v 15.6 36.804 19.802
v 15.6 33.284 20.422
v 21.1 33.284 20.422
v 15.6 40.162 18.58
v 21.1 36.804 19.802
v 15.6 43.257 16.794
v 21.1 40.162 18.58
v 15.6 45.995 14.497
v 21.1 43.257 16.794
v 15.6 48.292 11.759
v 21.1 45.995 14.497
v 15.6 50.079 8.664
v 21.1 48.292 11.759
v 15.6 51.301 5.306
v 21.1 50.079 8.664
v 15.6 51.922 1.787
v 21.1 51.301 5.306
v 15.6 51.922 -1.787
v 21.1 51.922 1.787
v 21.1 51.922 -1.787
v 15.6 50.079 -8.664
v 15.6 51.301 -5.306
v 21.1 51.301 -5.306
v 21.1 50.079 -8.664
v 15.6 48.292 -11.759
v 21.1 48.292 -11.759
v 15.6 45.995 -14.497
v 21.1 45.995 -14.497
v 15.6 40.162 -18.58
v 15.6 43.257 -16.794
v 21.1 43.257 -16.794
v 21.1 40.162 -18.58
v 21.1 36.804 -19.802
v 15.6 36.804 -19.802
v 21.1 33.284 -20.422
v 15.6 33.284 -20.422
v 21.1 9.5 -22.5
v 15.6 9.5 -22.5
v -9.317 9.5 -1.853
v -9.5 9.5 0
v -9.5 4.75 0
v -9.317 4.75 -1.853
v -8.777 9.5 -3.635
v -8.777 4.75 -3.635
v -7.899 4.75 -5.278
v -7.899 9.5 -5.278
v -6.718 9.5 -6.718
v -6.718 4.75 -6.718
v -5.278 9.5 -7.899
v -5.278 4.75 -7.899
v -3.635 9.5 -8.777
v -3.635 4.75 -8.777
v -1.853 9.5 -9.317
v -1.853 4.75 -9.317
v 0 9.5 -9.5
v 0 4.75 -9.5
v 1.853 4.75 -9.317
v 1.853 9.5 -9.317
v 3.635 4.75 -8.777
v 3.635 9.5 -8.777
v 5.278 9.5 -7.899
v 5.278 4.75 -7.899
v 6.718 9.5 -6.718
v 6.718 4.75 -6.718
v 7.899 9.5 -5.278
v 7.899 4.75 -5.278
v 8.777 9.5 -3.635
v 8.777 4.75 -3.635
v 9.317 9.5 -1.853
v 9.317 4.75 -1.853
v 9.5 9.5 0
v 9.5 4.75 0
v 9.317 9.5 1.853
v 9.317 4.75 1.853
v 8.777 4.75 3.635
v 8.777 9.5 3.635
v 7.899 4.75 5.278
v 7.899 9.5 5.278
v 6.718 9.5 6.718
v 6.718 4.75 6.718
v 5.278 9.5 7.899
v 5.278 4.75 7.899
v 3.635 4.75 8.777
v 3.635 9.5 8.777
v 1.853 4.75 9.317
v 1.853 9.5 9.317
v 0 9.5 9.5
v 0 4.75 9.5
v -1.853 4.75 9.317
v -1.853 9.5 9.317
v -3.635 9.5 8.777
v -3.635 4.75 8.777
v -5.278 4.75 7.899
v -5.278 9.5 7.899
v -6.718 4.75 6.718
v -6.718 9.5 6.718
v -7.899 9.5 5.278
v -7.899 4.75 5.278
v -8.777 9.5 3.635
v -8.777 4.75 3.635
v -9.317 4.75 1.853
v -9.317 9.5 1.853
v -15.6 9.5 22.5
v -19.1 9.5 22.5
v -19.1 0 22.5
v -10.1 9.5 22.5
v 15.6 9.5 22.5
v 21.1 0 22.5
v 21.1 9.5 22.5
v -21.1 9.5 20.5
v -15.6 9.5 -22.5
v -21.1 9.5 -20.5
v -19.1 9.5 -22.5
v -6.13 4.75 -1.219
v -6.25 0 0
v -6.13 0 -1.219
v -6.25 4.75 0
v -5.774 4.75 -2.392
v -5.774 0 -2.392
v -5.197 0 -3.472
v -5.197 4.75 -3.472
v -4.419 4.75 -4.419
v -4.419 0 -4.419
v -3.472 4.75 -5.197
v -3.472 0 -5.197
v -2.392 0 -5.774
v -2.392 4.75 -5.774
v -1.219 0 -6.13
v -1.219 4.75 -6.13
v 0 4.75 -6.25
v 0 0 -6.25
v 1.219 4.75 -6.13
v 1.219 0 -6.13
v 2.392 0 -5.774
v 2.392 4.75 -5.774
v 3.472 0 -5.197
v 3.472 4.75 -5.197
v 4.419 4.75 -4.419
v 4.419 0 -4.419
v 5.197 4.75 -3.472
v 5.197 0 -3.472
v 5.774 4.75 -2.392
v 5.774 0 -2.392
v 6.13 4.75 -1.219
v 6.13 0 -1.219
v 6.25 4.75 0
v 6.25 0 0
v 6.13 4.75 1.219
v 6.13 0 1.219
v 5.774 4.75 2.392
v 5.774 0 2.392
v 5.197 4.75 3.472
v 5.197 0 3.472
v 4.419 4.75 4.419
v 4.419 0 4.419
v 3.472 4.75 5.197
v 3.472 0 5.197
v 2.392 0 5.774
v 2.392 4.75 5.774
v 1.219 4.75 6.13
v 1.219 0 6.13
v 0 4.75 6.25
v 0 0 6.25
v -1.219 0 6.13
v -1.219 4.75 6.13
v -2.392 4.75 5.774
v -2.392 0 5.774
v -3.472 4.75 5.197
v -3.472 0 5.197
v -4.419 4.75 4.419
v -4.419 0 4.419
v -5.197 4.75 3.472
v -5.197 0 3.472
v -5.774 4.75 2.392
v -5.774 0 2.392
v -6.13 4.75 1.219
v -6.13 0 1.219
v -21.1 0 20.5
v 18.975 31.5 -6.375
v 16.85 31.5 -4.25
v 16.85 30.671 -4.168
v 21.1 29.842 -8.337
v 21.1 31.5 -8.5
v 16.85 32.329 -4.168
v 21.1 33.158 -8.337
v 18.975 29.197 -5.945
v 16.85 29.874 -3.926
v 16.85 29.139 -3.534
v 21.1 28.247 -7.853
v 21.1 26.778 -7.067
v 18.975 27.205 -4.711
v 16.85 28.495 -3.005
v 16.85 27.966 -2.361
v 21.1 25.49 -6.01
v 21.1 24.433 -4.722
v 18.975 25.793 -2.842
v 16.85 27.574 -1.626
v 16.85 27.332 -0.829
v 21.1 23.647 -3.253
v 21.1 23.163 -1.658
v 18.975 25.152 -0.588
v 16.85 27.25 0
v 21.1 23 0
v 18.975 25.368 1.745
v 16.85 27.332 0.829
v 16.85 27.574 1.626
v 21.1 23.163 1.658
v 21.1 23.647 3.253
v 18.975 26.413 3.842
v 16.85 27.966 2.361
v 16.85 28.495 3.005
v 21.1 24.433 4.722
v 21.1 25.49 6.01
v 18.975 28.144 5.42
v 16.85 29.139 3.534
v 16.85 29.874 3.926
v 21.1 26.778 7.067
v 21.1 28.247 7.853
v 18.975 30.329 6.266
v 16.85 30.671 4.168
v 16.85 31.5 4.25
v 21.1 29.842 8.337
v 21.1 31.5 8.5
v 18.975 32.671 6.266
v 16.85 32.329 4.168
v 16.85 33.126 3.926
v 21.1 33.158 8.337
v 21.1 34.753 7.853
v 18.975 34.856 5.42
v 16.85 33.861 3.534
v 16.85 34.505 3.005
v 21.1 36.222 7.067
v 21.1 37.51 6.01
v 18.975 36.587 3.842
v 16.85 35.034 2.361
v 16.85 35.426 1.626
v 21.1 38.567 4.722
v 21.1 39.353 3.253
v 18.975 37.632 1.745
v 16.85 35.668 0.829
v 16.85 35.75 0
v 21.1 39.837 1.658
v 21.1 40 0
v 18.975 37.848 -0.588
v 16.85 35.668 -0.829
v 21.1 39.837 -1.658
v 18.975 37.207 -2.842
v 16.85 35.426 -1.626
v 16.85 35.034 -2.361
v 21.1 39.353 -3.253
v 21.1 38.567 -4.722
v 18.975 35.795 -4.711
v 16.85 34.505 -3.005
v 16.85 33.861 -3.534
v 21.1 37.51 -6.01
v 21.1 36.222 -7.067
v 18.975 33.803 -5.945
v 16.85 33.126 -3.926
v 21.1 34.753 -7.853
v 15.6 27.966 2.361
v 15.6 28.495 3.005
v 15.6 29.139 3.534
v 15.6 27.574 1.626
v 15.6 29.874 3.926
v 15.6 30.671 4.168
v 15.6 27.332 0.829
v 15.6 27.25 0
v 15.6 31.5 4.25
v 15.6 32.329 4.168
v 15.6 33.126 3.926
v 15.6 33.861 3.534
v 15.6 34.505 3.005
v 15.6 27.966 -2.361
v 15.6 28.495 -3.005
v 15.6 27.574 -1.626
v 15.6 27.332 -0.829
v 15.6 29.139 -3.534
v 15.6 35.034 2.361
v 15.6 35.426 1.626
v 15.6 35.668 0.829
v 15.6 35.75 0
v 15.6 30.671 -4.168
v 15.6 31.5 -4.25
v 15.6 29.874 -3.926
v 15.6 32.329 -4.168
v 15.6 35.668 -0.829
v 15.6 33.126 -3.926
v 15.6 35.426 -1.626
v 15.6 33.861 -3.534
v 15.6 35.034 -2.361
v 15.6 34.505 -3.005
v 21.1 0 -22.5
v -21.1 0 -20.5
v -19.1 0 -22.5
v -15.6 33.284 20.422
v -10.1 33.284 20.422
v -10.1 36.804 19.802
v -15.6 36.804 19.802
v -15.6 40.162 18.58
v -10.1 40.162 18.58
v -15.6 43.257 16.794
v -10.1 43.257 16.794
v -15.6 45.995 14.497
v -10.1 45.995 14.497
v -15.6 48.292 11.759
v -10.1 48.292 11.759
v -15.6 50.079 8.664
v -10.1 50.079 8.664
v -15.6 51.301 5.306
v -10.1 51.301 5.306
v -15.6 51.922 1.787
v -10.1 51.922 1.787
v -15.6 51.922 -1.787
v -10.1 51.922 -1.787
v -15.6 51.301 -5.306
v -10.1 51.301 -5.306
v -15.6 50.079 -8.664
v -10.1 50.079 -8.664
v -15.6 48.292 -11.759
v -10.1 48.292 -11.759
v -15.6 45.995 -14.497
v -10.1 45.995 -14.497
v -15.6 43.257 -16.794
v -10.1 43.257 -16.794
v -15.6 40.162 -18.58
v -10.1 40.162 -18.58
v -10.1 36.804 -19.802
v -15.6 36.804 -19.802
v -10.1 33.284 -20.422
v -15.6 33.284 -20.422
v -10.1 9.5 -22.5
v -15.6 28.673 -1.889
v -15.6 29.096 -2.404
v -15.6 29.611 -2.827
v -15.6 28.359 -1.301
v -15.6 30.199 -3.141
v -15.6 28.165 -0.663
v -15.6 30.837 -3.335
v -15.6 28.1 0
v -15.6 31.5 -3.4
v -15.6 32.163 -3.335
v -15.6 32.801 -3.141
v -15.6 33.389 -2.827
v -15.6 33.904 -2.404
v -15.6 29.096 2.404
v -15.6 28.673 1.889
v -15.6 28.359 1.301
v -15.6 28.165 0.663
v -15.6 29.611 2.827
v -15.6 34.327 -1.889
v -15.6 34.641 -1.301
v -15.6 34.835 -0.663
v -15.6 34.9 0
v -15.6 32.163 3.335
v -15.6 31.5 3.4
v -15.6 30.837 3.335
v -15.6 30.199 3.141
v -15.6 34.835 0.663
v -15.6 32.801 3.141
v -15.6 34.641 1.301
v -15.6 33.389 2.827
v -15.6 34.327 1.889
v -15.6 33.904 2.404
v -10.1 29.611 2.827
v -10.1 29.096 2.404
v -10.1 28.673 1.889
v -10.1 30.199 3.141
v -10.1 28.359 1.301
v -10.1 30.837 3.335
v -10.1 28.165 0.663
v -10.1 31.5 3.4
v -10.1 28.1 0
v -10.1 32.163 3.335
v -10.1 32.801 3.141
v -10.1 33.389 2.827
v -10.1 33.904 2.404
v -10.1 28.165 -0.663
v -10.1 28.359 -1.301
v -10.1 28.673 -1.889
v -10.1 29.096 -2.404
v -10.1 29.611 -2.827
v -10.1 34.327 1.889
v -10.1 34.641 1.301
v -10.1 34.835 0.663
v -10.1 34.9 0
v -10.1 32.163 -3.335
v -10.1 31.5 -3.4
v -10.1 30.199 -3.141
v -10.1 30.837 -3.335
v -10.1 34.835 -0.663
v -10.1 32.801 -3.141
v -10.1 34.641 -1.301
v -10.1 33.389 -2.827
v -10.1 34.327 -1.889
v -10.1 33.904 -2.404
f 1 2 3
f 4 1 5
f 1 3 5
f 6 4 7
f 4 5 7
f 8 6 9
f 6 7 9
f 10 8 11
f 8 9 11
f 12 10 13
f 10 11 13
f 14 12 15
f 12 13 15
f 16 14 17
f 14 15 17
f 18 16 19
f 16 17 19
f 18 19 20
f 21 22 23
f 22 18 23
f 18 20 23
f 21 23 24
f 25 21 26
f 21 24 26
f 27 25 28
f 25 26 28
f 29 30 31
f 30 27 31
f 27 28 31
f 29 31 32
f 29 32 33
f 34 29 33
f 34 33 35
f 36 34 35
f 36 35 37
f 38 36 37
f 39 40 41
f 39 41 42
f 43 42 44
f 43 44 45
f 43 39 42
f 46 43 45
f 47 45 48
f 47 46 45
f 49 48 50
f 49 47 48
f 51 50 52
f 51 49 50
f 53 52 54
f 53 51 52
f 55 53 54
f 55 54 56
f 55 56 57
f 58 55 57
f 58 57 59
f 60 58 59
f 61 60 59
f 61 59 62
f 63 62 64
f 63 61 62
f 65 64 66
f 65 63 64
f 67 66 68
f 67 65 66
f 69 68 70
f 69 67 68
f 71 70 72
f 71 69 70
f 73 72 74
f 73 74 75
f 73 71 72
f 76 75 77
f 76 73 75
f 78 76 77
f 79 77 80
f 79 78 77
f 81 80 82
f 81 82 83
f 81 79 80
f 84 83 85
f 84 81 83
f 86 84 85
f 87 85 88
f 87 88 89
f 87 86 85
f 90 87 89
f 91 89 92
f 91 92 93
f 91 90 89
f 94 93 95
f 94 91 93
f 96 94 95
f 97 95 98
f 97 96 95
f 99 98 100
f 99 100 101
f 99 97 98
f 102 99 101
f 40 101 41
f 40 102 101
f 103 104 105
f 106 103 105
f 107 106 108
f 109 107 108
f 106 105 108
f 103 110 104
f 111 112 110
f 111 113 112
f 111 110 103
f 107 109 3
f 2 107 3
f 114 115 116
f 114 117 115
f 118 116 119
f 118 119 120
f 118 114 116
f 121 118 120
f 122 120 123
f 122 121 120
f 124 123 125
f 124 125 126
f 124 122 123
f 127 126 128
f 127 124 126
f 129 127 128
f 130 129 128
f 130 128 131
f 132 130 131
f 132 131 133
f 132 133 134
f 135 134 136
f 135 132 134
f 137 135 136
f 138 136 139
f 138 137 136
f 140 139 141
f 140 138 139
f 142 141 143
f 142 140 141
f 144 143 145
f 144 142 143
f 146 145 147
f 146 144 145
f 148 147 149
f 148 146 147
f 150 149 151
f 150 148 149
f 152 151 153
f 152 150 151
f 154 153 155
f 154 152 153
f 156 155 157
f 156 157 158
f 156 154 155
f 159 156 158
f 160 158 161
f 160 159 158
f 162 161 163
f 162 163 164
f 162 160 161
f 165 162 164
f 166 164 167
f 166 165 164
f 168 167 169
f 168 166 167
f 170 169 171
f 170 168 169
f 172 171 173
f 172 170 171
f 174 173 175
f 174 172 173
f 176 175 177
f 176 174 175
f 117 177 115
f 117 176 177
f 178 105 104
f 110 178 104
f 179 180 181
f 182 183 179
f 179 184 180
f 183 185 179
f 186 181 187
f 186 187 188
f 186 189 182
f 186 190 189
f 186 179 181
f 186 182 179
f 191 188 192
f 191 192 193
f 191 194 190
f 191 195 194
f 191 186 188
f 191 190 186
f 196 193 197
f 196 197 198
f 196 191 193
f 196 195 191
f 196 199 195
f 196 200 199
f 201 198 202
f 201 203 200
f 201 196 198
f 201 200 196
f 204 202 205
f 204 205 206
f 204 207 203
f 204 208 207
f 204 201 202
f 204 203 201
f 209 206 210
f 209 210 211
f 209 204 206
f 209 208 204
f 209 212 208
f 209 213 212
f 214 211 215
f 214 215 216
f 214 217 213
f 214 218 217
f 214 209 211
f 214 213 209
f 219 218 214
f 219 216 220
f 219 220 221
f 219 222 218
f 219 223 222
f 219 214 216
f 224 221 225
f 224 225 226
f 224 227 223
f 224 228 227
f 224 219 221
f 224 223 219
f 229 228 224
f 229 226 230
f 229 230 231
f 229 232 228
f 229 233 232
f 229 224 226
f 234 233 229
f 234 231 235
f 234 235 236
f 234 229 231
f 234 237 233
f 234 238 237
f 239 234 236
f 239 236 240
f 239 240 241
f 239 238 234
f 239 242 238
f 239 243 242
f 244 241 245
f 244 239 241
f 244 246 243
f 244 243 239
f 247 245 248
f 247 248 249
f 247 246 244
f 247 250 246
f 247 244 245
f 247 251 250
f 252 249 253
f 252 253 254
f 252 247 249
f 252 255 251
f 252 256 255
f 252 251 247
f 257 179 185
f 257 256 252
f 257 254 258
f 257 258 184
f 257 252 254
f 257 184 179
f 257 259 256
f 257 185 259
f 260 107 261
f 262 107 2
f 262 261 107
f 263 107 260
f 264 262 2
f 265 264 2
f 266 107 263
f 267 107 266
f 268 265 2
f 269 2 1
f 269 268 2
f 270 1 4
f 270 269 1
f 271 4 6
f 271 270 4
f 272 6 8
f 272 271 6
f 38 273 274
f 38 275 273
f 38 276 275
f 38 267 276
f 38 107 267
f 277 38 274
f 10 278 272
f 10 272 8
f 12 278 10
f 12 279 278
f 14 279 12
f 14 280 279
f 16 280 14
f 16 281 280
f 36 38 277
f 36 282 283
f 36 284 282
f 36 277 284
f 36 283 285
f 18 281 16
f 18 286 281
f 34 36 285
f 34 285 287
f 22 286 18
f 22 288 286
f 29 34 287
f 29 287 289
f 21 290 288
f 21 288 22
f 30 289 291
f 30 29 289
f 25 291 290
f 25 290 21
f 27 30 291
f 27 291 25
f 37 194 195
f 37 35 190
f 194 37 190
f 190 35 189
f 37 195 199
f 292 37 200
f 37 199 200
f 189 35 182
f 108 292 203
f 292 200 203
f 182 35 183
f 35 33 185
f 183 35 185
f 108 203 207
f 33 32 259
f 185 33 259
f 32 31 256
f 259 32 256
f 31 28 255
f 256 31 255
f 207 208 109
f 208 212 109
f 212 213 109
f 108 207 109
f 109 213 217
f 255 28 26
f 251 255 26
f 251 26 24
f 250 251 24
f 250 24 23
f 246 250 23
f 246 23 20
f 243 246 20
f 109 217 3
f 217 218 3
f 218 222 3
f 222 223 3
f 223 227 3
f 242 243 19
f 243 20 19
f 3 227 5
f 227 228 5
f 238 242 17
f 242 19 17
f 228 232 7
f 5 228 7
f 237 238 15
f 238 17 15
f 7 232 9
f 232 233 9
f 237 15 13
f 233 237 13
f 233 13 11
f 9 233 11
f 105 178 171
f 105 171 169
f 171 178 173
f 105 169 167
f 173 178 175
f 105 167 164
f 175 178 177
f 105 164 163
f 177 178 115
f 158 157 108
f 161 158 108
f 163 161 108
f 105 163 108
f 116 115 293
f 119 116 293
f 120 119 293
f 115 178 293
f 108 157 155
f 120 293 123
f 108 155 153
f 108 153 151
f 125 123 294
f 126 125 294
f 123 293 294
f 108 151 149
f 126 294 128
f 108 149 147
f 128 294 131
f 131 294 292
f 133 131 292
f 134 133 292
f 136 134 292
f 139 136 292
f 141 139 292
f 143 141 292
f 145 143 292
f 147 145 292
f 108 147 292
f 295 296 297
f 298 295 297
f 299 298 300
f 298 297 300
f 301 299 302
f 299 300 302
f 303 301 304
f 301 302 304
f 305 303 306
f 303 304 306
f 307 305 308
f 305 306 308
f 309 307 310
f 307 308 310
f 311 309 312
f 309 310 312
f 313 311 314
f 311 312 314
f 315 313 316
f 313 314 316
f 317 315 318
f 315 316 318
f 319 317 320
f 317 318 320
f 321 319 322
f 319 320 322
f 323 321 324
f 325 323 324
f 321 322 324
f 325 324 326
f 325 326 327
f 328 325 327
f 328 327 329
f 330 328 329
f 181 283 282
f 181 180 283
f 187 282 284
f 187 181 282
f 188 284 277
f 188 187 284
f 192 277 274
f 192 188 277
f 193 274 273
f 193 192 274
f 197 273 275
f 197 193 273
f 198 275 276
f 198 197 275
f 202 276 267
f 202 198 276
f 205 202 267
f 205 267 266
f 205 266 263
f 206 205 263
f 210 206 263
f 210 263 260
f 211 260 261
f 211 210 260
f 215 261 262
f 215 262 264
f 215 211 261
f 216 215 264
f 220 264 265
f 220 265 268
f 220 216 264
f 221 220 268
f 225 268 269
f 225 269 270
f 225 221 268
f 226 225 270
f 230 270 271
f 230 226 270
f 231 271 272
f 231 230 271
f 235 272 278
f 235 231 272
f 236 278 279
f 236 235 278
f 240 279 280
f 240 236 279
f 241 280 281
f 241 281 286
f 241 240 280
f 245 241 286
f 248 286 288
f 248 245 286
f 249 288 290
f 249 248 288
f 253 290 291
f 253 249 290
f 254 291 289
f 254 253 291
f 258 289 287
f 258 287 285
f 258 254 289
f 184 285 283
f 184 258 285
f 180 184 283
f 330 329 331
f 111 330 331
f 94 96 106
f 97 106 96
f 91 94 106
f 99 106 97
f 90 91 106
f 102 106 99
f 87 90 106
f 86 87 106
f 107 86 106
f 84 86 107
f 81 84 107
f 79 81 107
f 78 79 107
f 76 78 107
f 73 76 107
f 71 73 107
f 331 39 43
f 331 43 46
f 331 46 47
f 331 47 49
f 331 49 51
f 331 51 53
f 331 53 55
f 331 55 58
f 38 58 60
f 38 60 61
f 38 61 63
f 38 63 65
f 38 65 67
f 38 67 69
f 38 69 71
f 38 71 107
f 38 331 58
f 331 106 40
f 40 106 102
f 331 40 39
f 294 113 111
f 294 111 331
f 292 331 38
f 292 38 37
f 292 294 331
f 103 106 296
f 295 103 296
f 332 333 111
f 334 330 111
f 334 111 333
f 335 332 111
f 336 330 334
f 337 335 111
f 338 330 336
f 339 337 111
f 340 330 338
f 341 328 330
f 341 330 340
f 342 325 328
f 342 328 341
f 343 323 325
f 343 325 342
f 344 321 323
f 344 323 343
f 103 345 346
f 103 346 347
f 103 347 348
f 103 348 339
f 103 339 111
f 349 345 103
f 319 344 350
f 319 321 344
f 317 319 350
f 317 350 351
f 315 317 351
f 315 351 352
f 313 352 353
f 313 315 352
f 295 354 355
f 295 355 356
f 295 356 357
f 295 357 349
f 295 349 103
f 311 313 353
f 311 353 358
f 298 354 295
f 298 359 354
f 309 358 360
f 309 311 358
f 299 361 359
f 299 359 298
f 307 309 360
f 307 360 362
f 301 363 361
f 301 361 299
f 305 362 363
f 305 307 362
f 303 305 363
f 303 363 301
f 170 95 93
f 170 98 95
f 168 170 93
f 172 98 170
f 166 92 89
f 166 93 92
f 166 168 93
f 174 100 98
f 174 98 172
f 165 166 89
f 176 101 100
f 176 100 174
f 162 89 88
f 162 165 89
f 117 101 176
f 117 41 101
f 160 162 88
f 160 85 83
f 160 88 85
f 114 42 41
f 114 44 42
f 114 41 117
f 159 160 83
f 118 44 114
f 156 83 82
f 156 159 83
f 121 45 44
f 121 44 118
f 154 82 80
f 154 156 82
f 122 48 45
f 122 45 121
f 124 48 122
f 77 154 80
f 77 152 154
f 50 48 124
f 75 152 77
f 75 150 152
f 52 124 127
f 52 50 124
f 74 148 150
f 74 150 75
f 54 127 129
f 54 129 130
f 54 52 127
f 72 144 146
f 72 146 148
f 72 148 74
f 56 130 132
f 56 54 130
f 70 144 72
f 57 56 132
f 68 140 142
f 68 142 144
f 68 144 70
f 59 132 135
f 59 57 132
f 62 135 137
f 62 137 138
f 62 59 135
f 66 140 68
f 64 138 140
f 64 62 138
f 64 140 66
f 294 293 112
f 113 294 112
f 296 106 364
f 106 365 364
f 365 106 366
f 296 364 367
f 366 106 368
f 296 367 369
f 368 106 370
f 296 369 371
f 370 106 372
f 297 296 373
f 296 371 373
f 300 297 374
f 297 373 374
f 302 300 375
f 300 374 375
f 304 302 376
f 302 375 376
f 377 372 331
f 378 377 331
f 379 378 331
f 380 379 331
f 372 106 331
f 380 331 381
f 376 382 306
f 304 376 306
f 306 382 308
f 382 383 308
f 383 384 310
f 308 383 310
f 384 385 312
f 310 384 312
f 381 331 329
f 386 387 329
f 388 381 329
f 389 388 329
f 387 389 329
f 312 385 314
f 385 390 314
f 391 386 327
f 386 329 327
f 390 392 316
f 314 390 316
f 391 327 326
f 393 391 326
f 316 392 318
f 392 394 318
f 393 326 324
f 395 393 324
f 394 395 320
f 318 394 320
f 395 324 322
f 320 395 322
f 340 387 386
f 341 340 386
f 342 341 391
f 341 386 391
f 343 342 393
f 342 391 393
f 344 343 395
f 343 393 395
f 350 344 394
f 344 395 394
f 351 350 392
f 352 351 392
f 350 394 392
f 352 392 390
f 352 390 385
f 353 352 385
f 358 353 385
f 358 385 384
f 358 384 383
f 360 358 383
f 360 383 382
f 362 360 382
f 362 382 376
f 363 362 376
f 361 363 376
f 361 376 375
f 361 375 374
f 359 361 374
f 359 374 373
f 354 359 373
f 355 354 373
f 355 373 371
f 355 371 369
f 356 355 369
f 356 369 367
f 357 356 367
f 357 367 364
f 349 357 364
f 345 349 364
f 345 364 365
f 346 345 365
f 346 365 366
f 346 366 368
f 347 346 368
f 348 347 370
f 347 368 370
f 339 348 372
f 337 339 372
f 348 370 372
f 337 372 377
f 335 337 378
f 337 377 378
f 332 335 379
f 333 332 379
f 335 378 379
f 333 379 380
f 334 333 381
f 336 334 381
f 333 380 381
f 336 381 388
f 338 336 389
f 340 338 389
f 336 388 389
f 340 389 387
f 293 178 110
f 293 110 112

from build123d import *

# Parameters (mm, degrees)
SKETCH_1_W               = 42.2
SKETCH_1_H               = 45
EXTRUDE_1_DEPTH          = 9.5
EXTRUDE_2_DEPTH          = 36.7
SKETCH_4_W               = 25.7
SKETCH_4_H               = 42.5
CUT_EXTRUDE_1_DEPTH      = 23.5
CUT_EXTRUDE_1_DEPTH_BACK = 23.5
CHAMFER_1_SIZE           = 2
HOLE_WIZARD_M81_2_D      = 6.8
HOLE_WIZARD_M81_2_DEPTH  = 5.5


with BuildPart() as part:
    # Эскиз1 → Бобышка-Вытянуть1 (new body)
    with BuildSketch(Plane(origin=(0, 0, 0), x_dir=(1, 0, 0), z_dir=(0, 1, 0))):
        Rectangle(SKETCH_1_W, SKETCH_1_H)
    extrude(amount=EXTRUDE_1_DEPTH)

    # Эскиз2 → Вырез-Повернуть1 (revolve, cut)
    with BuildSketch(Plane.XY):
        Polygon((-6.25, 0), (-6.25, 4.75), (-9.5, 4.75), (-9.5, 9.5), (0, 9.5), (0, 0), align=None)
    revolve(axis=Axis((0, 9.5, 0), (0, -1, 0)), mode=Mode.SUBTRACT)

    # Эскиз3 → Бобышка-Вытянуть2 (add)
    with BuildSketch(Plane(origin=(21.1, 0, 0), x_dir=(0, 0, -1), z_dir=(1, 0, 0))):
        with BuildLine():
            Line((-22.5, 9.5), (-20.422219056, 33.284087671))
            ThreePointArc((-20.422219056, 33.284087671), (0, 52), (20.422219056, 33.284087671))
            Line((20.422219056, 33.284087671), (22.5, 9.5))
            Line((22.5, 9.5), (-22.5, 9.5))
        make_face()
    extrude(amount=-EXTRUDE_2_DEPTH)

    # Эскиз4 → Вырез-Вытянуть1 (cut, two sides)
    with BuildSketch(Plane.XY) as cut_extrude_1_sk:
        with Locations((2.75, 30.75)):
            Rectangle(SKETCH_4_W, SKETCH_4_H)
    extrude(amount=CUT_EXTRUDE_1_DEPTH, mode=Mode.SUBTRACT)
    extrude(cut_extrude_1_sk.sketch, amount=-CUT_EXTRUDE_1_DEPTH_BACK, mode=Mode.SUBTRACT)

    # Фаска1
    chamfer_1_edges = [part.edges().sort_by_distance(p)[0] for p in [
        (-21.1, 4.75, -22.5),
        (-21.1, 4.75, 22.5),
    ]]
    chamfer(chamfer_1_edges, length=CHAMFER_1_SIZE)

    # Эскиз10 → Hole Wizard M81 (revolve, cut)
    with BuildSketch(Plane(origin=(21.1, 31.5, 0), x_dir=(0, 0, -1), z_dir=(0, 1, 0))):
        Polygon((0, 0), (0, 5.5), (4.25, 5.5), (4.25, 4.25), (8.5, 0), align=None)
    revolve(axis=Axis((27.45, 31.5, 0), (-1, 0, 0)), mode=Mode.SUBTRACT)

    # Hole Wizard M81 2
    with Locations(Plane.ZY.offset(15.6)):
        with Locations((0, 31.5)):
            Hole(HOLE_WIZARD_M81_2_D / 2, depth=HOLE_WIZARD_M81_2_DEPTH)


solid = part.part
